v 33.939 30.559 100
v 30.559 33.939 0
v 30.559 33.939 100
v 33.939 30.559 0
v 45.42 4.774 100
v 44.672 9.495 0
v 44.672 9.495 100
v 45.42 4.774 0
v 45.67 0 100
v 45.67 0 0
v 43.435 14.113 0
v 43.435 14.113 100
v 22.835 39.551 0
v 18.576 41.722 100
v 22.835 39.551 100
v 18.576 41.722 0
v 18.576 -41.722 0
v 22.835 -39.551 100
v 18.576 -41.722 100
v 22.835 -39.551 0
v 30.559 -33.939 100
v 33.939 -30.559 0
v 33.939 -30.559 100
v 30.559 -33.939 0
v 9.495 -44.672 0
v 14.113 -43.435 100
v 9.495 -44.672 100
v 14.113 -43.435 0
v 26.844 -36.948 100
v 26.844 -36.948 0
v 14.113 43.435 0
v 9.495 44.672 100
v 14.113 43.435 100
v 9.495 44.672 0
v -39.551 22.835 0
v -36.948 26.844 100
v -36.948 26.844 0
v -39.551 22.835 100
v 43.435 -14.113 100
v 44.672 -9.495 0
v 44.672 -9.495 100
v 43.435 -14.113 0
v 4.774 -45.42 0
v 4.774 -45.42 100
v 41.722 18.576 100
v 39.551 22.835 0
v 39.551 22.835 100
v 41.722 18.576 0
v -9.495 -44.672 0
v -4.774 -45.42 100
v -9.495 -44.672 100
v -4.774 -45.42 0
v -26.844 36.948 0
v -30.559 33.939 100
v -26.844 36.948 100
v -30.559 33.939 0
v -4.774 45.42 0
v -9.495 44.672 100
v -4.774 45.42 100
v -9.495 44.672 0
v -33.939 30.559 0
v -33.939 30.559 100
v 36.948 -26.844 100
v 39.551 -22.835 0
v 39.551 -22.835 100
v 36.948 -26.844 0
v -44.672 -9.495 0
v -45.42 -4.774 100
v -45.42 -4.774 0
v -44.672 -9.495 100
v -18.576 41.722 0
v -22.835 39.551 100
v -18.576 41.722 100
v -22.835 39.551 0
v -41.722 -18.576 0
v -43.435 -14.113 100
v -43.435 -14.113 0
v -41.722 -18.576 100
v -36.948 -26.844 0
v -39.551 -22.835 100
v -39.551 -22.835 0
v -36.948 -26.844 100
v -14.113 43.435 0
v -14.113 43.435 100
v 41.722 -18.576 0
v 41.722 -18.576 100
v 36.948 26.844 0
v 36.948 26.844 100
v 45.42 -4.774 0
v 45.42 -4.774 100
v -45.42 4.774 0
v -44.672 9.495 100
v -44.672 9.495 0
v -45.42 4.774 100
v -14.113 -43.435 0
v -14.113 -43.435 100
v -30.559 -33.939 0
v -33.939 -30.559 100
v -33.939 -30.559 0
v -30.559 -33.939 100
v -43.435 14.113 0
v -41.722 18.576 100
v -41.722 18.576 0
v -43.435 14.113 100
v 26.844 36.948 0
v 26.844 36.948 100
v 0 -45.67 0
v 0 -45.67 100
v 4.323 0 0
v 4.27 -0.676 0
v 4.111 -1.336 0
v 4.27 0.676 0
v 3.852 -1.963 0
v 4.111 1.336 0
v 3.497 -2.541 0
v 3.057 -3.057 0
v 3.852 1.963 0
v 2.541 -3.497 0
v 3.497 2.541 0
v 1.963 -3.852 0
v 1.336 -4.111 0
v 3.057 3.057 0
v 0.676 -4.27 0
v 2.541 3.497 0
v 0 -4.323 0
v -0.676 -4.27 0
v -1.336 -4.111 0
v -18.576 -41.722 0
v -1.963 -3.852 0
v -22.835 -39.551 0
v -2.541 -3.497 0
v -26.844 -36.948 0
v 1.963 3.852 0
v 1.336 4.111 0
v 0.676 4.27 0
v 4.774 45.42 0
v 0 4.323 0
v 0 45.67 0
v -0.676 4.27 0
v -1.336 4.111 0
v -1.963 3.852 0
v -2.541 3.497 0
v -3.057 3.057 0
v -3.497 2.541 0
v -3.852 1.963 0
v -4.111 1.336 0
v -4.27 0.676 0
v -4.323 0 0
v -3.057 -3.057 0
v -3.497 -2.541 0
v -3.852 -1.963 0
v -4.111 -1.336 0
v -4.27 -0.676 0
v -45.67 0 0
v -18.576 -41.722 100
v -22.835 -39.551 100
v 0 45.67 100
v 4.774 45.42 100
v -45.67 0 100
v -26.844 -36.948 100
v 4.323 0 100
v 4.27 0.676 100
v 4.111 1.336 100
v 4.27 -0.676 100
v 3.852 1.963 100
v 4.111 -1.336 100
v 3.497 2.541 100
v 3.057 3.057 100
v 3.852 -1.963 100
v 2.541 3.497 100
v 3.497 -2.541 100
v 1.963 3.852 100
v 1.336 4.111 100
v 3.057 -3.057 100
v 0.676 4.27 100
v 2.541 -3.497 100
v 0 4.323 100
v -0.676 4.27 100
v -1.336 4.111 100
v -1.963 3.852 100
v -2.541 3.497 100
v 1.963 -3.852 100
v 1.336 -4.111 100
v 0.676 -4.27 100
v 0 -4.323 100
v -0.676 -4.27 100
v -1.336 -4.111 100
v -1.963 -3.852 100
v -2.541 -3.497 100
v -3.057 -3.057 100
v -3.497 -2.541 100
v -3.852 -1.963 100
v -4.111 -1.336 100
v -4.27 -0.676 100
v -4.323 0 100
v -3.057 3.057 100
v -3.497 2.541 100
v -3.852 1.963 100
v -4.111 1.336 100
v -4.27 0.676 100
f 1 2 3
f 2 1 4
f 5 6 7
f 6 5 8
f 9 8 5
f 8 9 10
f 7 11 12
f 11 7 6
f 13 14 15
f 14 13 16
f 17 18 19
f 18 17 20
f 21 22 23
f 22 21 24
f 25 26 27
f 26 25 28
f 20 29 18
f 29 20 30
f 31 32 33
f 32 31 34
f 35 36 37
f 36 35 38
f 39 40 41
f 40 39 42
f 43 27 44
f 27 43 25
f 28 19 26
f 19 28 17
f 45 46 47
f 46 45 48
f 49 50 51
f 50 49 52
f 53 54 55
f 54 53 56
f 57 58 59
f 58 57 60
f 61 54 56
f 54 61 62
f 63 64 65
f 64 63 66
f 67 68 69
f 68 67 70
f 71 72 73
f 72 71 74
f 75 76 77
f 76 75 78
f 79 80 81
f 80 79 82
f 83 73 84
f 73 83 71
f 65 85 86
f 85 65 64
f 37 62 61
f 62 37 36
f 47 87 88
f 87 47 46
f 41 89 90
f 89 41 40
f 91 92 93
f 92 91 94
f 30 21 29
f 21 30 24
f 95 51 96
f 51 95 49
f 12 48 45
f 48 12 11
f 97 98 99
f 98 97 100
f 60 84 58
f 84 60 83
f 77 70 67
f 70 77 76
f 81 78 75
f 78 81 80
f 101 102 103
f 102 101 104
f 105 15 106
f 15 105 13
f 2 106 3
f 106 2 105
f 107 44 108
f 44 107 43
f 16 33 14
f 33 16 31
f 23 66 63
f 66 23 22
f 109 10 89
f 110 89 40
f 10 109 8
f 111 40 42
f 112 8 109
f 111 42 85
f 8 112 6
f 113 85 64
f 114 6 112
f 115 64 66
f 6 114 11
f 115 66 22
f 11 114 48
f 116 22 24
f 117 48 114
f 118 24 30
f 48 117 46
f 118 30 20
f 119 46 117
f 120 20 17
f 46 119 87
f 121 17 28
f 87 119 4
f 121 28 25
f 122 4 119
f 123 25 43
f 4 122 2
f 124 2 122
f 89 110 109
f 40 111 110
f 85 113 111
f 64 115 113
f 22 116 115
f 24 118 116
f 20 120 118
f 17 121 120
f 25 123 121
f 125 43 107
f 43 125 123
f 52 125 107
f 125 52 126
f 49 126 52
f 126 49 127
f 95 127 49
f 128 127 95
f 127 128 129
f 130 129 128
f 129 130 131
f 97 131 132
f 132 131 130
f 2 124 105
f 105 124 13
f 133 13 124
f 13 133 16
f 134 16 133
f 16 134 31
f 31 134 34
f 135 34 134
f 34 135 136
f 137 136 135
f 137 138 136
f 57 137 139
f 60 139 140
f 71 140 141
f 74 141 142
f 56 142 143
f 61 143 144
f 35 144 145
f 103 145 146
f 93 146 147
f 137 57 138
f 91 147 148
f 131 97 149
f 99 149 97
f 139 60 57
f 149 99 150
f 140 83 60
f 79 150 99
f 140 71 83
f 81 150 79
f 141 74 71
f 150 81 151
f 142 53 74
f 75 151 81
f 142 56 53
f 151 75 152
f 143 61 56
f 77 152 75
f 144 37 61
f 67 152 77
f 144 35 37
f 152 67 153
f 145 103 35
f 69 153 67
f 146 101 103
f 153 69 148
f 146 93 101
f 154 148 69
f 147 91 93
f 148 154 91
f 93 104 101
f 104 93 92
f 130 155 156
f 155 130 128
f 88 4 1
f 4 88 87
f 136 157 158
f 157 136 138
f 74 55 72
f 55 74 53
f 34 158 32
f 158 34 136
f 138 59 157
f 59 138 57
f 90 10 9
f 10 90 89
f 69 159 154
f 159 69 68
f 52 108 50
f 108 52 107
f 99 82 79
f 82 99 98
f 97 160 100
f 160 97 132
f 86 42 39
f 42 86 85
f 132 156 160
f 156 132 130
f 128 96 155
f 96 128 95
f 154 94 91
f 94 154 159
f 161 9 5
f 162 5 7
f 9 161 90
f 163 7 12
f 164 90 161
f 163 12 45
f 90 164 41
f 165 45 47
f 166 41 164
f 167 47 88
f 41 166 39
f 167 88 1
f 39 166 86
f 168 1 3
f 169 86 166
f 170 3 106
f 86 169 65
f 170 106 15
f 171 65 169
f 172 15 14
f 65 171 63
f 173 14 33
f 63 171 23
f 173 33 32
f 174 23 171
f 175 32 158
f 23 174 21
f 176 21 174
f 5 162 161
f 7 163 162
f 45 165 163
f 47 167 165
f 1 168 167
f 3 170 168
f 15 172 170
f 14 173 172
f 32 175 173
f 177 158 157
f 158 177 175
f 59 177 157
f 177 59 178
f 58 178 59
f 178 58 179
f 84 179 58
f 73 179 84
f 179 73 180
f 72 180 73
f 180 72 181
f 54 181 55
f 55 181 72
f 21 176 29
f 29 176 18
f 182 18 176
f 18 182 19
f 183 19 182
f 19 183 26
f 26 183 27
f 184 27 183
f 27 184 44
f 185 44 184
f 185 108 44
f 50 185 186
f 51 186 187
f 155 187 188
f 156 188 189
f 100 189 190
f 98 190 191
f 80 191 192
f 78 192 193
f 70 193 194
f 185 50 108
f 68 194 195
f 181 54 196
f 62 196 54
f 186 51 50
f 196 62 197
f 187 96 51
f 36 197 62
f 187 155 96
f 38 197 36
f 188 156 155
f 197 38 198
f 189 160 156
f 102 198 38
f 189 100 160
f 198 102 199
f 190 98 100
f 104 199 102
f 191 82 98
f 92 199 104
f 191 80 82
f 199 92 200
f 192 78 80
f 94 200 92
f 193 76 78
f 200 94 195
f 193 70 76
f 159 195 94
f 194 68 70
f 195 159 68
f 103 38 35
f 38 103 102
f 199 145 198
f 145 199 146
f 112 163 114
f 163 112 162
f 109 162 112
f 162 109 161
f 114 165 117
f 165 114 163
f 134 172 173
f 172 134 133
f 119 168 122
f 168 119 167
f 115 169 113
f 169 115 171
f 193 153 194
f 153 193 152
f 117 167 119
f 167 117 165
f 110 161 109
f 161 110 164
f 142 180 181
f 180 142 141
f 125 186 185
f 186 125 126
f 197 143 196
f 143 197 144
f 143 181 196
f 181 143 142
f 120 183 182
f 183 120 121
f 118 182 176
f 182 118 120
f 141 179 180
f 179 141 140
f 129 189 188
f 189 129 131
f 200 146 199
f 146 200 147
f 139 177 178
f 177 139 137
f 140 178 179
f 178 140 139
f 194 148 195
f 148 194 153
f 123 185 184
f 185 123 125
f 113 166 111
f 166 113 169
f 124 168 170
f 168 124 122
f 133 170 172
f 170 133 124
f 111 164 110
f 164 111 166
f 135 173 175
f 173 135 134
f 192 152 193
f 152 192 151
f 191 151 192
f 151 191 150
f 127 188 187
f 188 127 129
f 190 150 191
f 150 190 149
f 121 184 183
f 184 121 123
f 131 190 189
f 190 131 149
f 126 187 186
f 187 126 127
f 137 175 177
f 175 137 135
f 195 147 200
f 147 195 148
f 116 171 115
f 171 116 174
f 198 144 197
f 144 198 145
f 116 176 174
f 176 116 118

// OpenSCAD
        wall_thickness = 6.4;
        bore_clearance = 2.323;
        roller_radius = 45.67;

        module roller() {
            difference() {
                cylinder(h=100, r=roller_radius, $fn=60);
                translate([0,0,-5])
                    cylinder(h=110, r=bore_clearance + 2, $fn=40);
            }
        }
        roller();
        
